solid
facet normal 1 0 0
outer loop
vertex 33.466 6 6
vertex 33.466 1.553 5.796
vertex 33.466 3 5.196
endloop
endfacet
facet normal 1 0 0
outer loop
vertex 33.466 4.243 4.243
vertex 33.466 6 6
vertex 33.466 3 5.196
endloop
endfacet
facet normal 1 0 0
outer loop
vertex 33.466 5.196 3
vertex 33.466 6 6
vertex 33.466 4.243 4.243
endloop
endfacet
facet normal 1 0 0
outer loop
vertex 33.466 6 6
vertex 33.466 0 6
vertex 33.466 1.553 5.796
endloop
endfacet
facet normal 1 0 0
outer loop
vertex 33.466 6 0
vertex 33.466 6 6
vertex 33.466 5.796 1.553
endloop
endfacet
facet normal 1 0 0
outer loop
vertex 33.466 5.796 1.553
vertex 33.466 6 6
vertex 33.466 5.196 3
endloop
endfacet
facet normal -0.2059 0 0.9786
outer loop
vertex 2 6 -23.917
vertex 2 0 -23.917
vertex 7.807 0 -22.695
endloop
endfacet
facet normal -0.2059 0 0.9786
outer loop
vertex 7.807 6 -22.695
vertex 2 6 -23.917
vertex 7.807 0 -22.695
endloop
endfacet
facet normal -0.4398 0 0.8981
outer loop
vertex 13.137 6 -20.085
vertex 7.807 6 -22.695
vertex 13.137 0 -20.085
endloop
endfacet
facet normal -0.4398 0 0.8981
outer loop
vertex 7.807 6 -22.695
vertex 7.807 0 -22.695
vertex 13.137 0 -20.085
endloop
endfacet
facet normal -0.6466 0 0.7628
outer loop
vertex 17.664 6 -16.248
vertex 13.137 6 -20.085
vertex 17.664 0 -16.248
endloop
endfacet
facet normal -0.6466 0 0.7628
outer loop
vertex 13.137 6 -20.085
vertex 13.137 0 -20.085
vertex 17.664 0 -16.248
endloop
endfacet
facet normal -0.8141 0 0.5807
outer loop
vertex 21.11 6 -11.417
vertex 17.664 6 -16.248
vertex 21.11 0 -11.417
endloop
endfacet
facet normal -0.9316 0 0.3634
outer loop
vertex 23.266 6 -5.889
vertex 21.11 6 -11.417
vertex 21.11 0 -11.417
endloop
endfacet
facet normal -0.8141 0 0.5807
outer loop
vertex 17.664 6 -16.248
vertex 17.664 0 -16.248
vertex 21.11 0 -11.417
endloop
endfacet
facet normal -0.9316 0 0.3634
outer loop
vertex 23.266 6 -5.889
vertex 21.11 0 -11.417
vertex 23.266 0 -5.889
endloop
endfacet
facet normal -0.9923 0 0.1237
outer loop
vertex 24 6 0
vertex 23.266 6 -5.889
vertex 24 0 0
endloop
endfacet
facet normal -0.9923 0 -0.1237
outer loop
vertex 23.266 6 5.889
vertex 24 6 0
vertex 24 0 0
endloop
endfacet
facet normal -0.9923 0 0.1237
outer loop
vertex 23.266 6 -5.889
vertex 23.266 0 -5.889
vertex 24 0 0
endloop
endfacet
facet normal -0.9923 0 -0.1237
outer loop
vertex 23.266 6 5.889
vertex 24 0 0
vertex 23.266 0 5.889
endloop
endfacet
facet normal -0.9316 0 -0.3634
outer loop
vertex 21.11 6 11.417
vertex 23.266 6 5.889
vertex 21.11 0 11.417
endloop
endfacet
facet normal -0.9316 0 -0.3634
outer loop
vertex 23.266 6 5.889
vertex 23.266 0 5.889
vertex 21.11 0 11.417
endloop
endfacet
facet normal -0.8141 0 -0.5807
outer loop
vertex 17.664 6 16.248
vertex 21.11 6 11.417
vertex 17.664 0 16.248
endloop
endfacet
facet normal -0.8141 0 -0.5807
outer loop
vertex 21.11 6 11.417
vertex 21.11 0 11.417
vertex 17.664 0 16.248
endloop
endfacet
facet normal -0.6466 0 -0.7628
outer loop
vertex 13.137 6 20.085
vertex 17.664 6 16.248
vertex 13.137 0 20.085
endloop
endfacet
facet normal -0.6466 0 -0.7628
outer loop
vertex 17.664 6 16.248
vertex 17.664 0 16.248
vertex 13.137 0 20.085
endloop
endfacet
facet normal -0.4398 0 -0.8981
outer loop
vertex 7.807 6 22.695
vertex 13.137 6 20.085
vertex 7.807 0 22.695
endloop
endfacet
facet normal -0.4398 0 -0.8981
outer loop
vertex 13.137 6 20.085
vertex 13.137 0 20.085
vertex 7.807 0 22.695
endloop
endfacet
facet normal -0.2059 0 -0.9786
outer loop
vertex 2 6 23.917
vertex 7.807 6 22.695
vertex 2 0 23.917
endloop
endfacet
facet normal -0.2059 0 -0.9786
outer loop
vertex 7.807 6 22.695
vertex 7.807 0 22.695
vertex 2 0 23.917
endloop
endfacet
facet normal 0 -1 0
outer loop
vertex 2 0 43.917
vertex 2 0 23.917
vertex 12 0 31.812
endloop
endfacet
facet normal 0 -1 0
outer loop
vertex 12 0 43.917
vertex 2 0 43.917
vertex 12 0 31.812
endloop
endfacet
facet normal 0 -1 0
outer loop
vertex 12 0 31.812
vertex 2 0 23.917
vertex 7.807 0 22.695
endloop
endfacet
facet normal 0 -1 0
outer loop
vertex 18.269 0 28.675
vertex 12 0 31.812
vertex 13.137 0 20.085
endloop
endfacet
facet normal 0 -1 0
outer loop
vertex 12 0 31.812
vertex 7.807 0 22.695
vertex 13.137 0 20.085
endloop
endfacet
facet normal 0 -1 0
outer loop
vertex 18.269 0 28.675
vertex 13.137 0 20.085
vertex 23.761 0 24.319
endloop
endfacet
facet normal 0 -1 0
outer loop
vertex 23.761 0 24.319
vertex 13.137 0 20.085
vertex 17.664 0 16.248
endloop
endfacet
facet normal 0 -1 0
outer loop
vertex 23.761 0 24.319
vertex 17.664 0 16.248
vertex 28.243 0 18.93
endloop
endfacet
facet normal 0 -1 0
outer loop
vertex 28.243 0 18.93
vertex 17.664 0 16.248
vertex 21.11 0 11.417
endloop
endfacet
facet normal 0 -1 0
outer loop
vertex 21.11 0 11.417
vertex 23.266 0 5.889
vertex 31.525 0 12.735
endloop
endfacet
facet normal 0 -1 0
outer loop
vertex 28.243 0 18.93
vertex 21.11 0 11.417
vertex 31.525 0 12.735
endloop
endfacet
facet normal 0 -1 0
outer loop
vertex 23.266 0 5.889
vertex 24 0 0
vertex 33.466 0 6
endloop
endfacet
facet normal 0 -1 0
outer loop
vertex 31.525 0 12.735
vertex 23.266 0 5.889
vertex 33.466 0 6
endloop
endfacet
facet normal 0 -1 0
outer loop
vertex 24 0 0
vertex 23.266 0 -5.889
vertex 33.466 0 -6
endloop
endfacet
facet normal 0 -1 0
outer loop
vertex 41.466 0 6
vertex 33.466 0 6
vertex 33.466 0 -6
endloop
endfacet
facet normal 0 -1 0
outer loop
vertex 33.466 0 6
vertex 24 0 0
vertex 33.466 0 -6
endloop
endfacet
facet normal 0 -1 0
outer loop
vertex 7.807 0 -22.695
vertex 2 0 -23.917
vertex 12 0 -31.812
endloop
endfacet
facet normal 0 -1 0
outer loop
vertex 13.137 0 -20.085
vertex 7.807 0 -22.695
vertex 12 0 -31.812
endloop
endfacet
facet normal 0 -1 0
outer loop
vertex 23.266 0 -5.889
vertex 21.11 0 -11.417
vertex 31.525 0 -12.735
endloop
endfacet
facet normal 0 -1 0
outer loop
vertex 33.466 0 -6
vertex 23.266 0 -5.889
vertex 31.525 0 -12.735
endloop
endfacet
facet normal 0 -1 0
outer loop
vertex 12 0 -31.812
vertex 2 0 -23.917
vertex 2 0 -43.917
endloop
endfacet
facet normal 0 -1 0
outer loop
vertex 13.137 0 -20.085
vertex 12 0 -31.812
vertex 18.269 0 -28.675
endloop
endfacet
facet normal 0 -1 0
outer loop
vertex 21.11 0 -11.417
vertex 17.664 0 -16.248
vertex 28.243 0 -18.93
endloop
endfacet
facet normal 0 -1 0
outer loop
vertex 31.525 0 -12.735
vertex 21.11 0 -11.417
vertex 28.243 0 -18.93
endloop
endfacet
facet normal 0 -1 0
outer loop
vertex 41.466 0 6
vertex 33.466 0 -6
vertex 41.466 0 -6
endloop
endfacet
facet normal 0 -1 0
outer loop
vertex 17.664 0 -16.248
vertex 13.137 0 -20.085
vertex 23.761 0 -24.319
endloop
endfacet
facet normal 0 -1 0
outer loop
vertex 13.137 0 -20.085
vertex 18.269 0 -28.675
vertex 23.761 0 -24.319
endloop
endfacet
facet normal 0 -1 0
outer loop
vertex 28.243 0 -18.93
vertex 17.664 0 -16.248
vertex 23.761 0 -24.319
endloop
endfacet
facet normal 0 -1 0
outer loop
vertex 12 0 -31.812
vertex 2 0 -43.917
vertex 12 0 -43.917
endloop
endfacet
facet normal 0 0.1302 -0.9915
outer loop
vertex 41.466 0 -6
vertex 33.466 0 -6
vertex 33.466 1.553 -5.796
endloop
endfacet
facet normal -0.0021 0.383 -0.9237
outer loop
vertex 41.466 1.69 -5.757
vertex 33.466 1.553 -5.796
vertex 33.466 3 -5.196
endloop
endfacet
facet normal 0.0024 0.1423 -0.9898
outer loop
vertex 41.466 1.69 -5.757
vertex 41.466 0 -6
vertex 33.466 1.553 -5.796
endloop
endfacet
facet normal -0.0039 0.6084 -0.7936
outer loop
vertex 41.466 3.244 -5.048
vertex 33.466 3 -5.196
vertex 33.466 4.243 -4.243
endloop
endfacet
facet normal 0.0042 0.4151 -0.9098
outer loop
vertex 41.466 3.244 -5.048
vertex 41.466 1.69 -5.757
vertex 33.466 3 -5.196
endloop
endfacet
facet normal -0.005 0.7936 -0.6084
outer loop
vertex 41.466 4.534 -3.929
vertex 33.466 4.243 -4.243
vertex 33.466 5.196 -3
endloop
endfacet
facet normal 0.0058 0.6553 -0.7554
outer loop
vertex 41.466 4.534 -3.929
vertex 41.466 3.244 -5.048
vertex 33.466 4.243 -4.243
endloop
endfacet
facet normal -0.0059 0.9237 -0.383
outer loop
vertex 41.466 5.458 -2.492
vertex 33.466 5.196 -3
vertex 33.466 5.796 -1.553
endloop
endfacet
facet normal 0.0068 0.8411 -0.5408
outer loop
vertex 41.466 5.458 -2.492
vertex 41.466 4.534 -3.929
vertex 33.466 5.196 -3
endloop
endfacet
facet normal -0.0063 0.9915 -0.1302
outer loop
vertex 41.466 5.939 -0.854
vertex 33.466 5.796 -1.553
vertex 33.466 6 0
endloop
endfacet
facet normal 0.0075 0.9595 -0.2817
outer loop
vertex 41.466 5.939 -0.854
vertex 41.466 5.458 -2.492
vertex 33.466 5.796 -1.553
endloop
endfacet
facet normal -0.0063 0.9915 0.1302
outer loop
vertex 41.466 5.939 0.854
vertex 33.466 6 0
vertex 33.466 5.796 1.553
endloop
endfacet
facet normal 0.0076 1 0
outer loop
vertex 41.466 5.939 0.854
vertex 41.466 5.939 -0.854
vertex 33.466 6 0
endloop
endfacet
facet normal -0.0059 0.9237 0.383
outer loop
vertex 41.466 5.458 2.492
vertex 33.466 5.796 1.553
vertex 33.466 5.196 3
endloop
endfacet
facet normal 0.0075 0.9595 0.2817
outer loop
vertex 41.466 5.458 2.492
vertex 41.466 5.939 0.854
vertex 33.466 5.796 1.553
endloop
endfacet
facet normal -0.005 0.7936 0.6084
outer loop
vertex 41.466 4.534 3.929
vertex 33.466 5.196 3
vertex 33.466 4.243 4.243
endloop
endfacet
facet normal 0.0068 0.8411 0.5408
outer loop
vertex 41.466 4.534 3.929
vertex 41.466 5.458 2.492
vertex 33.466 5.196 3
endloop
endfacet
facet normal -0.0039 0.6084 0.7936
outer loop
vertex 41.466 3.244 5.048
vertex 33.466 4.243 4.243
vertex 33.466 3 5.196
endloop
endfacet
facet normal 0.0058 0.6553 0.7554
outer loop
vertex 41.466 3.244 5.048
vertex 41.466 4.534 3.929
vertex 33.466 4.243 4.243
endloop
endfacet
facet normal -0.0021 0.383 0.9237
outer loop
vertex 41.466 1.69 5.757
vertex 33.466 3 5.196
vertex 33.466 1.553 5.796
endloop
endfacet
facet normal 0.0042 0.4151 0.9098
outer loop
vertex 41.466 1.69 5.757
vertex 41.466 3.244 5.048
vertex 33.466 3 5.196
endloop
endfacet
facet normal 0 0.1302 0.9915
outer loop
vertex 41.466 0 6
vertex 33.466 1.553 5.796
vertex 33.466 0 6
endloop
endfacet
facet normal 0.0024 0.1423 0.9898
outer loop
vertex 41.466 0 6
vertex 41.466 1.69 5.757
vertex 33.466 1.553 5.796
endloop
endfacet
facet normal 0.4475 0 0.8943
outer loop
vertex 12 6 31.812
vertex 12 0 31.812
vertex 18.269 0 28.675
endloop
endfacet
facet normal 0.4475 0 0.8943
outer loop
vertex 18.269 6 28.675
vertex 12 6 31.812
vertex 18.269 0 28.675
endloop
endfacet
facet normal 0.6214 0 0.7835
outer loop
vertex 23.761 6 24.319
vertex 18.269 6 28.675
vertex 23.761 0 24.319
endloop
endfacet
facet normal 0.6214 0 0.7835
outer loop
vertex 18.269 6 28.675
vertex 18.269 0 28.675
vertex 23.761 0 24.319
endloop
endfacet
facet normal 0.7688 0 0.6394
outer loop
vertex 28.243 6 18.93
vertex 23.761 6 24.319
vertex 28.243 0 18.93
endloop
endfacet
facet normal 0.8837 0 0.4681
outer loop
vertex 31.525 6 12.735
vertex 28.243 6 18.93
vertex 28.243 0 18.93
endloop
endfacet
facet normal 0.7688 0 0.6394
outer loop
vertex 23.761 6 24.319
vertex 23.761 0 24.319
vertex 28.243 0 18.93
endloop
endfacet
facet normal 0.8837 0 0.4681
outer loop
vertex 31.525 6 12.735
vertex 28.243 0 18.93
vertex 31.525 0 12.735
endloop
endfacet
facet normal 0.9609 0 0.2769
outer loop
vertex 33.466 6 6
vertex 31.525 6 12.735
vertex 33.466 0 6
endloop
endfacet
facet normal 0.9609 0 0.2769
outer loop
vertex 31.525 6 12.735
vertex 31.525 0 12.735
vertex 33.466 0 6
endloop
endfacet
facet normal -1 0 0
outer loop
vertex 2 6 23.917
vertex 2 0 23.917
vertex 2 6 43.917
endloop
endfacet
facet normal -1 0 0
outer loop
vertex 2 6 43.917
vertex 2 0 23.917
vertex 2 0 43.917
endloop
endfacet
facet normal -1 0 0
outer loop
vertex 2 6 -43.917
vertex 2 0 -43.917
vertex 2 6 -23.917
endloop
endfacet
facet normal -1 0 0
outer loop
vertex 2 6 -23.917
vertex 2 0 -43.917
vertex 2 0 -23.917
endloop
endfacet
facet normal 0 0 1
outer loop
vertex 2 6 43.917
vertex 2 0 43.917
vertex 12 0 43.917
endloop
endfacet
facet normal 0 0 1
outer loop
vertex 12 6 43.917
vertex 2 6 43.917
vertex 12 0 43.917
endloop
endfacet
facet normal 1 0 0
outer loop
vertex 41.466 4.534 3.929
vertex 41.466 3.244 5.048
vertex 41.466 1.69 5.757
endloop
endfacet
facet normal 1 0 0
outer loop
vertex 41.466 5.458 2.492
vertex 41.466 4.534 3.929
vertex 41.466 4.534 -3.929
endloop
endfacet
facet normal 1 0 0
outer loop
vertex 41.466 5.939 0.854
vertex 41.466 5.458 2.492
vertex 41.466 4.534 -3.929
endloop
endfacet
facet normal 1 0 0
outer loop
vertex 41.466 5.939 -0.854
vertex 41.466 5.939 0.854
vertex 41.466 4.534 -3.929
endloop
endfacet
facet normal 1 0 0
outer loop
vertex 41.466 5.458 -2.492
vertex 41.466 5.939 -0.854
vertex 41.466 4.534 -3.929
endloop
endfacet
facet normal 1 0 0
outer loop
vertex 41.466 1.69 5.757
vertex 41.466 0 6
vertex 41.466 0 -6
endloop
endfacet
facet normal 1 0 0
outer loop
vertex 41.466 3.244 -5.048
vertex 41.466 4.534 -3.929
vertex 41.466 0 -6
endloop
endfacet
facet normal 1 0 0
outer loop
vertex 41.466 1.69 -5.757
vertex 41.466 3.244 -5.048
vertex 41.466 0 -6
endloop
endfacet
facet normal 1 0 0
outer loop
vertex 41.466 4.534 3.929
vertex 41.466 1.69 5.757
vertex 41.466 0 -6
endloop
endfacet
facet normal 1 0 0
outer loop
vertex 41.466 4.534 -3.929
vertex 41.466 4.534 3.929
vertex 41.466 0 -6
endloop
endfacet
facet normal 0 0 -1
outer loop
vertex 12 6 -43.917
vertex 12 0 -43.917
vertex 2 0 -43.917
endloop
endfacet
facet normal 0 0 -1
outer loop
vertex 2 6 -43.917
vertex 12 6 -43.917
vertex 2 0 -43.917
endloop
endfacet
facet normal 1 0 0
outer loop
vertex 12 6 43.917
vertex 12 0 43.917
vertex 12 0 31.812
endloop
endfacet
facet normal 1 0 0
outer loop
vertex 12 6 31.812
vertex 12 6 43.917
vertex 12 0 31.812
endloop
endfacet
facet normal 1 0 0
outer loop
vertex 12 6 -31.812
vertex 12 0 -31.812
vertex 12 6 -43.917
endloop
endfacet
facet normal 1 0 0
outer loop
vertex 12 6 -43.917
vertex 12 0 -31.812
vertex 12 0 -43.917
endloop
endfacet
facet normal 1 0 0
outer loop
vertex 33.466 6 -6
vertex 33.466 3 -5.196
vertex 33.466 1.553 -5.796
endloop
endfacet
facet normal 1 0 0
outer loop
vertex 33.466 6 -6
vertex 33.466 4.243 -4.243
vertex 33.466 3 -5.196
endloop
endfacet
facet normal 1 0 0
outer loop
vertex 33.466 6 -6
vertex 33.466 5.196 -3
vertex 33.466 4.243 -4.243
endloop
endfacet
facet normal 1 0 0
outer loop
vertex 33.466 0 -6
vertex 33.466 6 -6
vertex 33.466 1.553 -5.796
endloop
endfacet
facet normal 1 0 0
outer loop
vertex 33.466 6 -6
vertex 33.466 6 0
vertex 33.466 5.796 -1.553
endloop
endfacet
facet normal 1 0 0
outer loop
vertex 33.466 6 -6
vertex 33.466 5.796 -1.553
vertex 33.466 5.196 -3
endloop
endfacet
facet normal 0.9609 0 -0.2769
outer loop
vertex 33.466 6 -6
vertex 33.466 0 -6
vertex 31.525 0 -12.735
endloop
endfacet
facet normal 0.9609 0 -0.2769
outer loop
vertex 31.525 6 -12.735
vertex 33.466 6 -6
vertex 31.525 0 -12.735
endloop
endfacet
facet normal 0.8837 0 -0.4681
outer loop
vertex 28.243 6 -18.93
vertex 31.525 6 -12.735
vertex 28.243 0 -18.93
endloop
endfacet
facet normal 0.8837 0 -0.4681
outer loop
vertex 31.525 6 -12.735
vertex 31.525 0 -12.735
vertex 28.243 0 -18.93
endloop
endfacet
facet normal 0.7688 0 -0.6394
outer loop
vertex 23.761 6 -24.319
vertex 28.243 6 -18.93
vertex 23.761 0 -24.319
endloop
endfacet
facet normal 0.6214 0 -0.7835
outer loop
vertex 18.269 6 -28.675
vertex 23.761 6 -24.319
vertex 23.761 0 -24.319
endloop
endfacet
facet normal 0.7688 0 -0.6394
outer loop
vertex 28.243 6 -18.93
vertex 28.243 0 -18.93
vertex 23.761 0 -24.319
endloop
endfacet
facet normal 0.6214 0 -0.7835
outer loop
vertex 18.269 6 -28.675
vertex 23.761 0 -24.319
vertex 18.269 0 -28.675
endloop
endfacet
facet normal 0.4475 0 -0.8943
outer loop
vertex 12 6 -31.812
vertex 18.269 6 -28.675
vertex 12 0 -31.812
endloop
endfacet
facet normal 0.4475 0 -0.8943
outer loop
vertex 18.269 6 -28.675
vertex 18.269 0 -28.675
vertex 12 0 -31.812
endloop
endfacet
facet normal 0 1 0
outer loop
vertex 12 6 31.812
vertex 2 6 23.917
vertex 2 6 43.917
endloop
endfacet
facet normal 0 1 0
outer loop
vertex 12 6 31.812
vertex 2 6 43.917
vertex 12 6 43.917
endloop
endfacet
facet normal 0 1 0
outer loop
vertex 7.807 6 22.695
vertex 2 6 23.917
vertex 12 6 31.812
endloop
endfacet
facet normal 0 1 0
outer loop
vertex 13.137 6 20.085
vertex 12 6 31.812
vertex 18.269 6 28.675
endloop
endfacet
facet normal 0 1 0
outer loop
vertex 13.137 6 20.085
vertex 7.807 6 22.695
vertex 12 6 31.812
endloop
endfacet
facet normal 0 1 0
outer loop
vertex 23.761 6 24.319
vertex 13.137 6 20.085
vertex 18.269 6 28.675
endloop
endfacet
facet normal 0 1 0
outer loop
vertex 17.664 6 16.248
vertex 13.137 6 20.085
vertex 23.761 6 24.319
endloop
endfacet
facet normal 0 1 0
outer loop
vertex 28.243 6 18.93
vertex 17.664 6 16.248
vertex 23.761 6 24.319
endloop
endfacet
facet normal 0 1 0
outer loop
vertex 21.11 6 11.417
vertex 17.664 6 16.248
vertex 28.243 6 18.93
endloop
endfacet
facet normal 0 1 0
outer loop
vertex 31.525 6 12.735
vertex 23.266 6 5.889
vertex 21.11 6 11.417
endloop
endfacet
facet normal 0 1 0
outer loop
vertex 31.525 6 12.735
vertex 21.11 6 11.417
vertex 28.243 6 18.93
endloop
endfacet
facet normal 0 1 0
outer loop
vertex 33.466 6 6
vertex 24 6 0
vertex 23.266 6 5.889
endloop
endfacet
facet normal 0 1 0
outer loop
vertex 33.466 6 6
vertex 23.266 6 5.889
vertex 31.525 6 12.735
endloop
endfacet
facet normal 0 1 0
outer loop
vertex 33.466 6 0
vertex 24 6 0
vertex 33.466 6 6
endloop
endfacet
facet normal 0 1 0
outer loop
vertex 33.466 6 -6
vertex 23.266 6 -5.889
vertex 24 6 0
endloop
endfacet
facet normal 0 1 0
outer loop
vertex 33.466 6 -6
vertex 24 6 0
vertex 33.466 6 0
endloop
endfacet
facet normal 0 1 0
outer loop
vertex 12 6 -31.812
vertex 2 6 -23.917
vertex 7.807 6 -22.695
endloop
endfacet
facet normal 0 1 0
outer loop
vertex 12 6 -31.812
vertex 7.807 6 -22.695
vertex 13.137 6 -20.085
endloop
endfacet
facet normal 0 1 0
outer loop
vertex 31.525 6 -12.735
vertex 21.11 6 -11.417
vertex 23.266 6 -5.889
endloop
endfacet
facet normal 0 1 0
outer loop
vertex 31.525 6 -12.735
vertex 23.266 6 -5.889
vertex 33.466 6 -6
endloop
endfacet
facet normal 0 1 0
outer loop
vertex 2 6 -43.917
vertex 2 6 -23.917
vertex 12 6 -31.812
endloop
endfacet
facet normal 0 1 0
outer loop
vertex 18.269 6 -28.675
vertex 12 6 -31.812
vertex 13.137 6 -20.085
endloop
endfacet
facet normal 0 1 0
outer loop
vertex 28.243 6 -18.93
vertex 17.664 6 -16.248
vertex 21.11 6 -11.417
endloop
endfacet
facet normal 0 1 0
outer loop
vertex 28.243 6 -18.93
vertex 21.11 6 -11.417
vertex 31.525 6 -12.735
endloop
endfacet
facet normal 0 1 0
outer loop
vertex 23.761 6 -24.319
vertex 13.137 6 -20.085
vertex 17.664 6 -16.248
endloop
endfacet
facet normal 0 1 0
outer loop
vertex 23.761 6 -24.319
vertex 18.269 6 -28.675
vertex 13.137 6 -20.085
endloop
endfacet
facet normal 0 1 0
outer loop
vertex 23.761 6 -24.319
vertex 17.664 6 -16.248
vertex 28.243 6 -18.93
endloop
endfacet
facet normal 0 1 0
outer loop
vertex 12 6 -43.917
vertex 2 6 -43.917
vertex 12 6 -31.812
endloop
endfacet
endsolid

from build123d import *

# Parameters (mm, degrees)
BOSS_EXTRUDE1_DEPTH = 6
SKETCH2_OUTSIDE_W   = 109.13
SKETCH2_OUTSIDE_H   = 27.296
CUT_EXTRUDE1_DEPTH  = 8


with BuildPart() as part:
    # Sketch1 → Boss-Extrude1 (new body)
    with BuildSketch(Plane(origin=(0, 0, 0), x_dir=(1, 0, 0), z_dir=(0, 1, 0))):
        with BuildLine():
            Line((2, 43.916521486), (2, 23.916521486))
            ThreePointArc((2, 23.916521486), (24, 0), (2, -23.916521486))
            Line((2, -23.916521486), (2, -43.916521486))
            Line((2, -43.916521486), (12, -43.916521486))
            Line((12, -43.916521486), (12, -31.811947441))
            ThreePointArc((12, -31.811947441), (26.141204334, -21.740226217), (33.466401061, -6))
            Line((33.466401061, -6), (41.466401061, -6))
            Line((41.466401061, -6), (41.466401061, 6))
            Line((41.466401061, 6), (33.466401061, 6))
            ThreePointArc((33.466401061, 6), (26.141204334, 21.740226217), (12, 31.811947441))
            Line((12, 31.811947441), (12, 43.916521486))
            Line((12, 43.916521486), (2, 43.916521486))
        make_face()
    extrude(amount=BOSS_EXTRUDE1_DEPTH)

    # Sketch2 outside → Cut-Extrude1 (cut)
    with BuildSketch(Plane(origin=(41.466401061, 0, 0), x_dir=(0, 0, -1), z_dir=(1, 0, 0))):
        with Locations((0, 3)):
            Rectangle(SKETCH2_OUTSIDE_W, SKETCH2_OUTSIDE_H)
        with BuildLine():
            Line((-6, 0), (6, 0))
            ThreePointArc((6, 0), (0, 6), (-6, 0))
        make_face(mode=Mode.SUBTRACT)
    extrude(amount=-CUT_EXTRUDE1_DEPTH, mode=Mode.SUBTRACT)


solid = part.part
